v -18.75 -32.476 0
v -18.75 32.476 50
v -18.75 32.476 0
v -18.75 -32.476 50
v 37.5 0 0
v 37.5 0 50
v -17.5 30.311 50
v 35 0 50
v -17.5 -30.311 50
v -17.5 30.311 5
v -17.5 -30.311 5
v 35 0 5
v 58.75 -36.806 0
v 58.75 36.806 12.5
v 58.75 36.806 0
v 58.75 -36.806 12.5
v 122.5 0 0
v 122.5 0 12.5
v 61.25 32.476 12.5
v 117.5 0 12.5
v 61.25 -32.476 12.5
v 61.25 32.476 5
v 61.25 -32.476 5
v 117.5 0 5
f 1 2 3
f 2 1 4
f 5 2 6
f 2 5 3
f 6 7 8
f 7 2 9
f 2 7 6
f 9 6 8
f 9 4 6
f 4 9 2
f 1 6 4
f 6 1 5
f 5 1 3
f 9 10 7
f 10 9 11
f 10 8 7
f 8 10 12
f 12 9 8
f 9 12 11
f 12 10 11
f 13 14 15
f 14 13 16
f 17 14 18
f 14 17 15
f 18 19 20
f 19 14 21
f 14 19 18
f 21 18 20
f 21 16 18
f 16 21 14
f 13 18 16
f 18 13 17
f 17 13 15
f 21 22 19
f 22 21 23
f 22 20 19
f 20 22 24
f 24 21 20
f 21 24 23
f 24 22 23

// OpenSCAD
// Geometric Container/Vase
// Nick Moeggenborg
// 10/1/2019

/* [Part] */

Part = "3"; //[1:Container,2:Lid,3:Both]

/* [Container] */

// Container Shape
$fn = 3; //[3:Triangle,4:Square,5:Pentagon,6:Hexagon,7:Heptagon,8:Octagon,9:Nonagon,10:Rough Circle,100:Smooth Circle] 

// Container Diameter in mm
D_con = 75;

// Container Height in mm
H_con = 50;

// Container Thickness (walls and base) in mm
T_con = 5;

/* Lid */

// Lid Diameter in mm
D_lid = D_con + T_con;

// Lid Height in mm
H_lid = 0.25*H_con;

// Lid Thickness (walls and base) in mm
T_lid = T_con;


if (Part=="1"){
    Container();
}else if (Part == "2"){
    translate([-D_con+T_con,0,0])
    Lid();
}else {
    Container();
    Lid();
}
//


module Container()
{
    difference(){
        cylinder(h=H_con,d=D_con);
    
        translate([0,0,T_con])
            cylinder(h=1.5*H_con,d=D_con-T_con);
    }
}
//

module Lid()
{
translate([D_con+T_con,0,0])
difference(){
    cylinder(h=H_lid,d=D_lid+T_con);
    
    translate([0,0,T_lid])
        cylinder(h=1.5*H_lid,d=D_lid-T_lid);
    }
}
